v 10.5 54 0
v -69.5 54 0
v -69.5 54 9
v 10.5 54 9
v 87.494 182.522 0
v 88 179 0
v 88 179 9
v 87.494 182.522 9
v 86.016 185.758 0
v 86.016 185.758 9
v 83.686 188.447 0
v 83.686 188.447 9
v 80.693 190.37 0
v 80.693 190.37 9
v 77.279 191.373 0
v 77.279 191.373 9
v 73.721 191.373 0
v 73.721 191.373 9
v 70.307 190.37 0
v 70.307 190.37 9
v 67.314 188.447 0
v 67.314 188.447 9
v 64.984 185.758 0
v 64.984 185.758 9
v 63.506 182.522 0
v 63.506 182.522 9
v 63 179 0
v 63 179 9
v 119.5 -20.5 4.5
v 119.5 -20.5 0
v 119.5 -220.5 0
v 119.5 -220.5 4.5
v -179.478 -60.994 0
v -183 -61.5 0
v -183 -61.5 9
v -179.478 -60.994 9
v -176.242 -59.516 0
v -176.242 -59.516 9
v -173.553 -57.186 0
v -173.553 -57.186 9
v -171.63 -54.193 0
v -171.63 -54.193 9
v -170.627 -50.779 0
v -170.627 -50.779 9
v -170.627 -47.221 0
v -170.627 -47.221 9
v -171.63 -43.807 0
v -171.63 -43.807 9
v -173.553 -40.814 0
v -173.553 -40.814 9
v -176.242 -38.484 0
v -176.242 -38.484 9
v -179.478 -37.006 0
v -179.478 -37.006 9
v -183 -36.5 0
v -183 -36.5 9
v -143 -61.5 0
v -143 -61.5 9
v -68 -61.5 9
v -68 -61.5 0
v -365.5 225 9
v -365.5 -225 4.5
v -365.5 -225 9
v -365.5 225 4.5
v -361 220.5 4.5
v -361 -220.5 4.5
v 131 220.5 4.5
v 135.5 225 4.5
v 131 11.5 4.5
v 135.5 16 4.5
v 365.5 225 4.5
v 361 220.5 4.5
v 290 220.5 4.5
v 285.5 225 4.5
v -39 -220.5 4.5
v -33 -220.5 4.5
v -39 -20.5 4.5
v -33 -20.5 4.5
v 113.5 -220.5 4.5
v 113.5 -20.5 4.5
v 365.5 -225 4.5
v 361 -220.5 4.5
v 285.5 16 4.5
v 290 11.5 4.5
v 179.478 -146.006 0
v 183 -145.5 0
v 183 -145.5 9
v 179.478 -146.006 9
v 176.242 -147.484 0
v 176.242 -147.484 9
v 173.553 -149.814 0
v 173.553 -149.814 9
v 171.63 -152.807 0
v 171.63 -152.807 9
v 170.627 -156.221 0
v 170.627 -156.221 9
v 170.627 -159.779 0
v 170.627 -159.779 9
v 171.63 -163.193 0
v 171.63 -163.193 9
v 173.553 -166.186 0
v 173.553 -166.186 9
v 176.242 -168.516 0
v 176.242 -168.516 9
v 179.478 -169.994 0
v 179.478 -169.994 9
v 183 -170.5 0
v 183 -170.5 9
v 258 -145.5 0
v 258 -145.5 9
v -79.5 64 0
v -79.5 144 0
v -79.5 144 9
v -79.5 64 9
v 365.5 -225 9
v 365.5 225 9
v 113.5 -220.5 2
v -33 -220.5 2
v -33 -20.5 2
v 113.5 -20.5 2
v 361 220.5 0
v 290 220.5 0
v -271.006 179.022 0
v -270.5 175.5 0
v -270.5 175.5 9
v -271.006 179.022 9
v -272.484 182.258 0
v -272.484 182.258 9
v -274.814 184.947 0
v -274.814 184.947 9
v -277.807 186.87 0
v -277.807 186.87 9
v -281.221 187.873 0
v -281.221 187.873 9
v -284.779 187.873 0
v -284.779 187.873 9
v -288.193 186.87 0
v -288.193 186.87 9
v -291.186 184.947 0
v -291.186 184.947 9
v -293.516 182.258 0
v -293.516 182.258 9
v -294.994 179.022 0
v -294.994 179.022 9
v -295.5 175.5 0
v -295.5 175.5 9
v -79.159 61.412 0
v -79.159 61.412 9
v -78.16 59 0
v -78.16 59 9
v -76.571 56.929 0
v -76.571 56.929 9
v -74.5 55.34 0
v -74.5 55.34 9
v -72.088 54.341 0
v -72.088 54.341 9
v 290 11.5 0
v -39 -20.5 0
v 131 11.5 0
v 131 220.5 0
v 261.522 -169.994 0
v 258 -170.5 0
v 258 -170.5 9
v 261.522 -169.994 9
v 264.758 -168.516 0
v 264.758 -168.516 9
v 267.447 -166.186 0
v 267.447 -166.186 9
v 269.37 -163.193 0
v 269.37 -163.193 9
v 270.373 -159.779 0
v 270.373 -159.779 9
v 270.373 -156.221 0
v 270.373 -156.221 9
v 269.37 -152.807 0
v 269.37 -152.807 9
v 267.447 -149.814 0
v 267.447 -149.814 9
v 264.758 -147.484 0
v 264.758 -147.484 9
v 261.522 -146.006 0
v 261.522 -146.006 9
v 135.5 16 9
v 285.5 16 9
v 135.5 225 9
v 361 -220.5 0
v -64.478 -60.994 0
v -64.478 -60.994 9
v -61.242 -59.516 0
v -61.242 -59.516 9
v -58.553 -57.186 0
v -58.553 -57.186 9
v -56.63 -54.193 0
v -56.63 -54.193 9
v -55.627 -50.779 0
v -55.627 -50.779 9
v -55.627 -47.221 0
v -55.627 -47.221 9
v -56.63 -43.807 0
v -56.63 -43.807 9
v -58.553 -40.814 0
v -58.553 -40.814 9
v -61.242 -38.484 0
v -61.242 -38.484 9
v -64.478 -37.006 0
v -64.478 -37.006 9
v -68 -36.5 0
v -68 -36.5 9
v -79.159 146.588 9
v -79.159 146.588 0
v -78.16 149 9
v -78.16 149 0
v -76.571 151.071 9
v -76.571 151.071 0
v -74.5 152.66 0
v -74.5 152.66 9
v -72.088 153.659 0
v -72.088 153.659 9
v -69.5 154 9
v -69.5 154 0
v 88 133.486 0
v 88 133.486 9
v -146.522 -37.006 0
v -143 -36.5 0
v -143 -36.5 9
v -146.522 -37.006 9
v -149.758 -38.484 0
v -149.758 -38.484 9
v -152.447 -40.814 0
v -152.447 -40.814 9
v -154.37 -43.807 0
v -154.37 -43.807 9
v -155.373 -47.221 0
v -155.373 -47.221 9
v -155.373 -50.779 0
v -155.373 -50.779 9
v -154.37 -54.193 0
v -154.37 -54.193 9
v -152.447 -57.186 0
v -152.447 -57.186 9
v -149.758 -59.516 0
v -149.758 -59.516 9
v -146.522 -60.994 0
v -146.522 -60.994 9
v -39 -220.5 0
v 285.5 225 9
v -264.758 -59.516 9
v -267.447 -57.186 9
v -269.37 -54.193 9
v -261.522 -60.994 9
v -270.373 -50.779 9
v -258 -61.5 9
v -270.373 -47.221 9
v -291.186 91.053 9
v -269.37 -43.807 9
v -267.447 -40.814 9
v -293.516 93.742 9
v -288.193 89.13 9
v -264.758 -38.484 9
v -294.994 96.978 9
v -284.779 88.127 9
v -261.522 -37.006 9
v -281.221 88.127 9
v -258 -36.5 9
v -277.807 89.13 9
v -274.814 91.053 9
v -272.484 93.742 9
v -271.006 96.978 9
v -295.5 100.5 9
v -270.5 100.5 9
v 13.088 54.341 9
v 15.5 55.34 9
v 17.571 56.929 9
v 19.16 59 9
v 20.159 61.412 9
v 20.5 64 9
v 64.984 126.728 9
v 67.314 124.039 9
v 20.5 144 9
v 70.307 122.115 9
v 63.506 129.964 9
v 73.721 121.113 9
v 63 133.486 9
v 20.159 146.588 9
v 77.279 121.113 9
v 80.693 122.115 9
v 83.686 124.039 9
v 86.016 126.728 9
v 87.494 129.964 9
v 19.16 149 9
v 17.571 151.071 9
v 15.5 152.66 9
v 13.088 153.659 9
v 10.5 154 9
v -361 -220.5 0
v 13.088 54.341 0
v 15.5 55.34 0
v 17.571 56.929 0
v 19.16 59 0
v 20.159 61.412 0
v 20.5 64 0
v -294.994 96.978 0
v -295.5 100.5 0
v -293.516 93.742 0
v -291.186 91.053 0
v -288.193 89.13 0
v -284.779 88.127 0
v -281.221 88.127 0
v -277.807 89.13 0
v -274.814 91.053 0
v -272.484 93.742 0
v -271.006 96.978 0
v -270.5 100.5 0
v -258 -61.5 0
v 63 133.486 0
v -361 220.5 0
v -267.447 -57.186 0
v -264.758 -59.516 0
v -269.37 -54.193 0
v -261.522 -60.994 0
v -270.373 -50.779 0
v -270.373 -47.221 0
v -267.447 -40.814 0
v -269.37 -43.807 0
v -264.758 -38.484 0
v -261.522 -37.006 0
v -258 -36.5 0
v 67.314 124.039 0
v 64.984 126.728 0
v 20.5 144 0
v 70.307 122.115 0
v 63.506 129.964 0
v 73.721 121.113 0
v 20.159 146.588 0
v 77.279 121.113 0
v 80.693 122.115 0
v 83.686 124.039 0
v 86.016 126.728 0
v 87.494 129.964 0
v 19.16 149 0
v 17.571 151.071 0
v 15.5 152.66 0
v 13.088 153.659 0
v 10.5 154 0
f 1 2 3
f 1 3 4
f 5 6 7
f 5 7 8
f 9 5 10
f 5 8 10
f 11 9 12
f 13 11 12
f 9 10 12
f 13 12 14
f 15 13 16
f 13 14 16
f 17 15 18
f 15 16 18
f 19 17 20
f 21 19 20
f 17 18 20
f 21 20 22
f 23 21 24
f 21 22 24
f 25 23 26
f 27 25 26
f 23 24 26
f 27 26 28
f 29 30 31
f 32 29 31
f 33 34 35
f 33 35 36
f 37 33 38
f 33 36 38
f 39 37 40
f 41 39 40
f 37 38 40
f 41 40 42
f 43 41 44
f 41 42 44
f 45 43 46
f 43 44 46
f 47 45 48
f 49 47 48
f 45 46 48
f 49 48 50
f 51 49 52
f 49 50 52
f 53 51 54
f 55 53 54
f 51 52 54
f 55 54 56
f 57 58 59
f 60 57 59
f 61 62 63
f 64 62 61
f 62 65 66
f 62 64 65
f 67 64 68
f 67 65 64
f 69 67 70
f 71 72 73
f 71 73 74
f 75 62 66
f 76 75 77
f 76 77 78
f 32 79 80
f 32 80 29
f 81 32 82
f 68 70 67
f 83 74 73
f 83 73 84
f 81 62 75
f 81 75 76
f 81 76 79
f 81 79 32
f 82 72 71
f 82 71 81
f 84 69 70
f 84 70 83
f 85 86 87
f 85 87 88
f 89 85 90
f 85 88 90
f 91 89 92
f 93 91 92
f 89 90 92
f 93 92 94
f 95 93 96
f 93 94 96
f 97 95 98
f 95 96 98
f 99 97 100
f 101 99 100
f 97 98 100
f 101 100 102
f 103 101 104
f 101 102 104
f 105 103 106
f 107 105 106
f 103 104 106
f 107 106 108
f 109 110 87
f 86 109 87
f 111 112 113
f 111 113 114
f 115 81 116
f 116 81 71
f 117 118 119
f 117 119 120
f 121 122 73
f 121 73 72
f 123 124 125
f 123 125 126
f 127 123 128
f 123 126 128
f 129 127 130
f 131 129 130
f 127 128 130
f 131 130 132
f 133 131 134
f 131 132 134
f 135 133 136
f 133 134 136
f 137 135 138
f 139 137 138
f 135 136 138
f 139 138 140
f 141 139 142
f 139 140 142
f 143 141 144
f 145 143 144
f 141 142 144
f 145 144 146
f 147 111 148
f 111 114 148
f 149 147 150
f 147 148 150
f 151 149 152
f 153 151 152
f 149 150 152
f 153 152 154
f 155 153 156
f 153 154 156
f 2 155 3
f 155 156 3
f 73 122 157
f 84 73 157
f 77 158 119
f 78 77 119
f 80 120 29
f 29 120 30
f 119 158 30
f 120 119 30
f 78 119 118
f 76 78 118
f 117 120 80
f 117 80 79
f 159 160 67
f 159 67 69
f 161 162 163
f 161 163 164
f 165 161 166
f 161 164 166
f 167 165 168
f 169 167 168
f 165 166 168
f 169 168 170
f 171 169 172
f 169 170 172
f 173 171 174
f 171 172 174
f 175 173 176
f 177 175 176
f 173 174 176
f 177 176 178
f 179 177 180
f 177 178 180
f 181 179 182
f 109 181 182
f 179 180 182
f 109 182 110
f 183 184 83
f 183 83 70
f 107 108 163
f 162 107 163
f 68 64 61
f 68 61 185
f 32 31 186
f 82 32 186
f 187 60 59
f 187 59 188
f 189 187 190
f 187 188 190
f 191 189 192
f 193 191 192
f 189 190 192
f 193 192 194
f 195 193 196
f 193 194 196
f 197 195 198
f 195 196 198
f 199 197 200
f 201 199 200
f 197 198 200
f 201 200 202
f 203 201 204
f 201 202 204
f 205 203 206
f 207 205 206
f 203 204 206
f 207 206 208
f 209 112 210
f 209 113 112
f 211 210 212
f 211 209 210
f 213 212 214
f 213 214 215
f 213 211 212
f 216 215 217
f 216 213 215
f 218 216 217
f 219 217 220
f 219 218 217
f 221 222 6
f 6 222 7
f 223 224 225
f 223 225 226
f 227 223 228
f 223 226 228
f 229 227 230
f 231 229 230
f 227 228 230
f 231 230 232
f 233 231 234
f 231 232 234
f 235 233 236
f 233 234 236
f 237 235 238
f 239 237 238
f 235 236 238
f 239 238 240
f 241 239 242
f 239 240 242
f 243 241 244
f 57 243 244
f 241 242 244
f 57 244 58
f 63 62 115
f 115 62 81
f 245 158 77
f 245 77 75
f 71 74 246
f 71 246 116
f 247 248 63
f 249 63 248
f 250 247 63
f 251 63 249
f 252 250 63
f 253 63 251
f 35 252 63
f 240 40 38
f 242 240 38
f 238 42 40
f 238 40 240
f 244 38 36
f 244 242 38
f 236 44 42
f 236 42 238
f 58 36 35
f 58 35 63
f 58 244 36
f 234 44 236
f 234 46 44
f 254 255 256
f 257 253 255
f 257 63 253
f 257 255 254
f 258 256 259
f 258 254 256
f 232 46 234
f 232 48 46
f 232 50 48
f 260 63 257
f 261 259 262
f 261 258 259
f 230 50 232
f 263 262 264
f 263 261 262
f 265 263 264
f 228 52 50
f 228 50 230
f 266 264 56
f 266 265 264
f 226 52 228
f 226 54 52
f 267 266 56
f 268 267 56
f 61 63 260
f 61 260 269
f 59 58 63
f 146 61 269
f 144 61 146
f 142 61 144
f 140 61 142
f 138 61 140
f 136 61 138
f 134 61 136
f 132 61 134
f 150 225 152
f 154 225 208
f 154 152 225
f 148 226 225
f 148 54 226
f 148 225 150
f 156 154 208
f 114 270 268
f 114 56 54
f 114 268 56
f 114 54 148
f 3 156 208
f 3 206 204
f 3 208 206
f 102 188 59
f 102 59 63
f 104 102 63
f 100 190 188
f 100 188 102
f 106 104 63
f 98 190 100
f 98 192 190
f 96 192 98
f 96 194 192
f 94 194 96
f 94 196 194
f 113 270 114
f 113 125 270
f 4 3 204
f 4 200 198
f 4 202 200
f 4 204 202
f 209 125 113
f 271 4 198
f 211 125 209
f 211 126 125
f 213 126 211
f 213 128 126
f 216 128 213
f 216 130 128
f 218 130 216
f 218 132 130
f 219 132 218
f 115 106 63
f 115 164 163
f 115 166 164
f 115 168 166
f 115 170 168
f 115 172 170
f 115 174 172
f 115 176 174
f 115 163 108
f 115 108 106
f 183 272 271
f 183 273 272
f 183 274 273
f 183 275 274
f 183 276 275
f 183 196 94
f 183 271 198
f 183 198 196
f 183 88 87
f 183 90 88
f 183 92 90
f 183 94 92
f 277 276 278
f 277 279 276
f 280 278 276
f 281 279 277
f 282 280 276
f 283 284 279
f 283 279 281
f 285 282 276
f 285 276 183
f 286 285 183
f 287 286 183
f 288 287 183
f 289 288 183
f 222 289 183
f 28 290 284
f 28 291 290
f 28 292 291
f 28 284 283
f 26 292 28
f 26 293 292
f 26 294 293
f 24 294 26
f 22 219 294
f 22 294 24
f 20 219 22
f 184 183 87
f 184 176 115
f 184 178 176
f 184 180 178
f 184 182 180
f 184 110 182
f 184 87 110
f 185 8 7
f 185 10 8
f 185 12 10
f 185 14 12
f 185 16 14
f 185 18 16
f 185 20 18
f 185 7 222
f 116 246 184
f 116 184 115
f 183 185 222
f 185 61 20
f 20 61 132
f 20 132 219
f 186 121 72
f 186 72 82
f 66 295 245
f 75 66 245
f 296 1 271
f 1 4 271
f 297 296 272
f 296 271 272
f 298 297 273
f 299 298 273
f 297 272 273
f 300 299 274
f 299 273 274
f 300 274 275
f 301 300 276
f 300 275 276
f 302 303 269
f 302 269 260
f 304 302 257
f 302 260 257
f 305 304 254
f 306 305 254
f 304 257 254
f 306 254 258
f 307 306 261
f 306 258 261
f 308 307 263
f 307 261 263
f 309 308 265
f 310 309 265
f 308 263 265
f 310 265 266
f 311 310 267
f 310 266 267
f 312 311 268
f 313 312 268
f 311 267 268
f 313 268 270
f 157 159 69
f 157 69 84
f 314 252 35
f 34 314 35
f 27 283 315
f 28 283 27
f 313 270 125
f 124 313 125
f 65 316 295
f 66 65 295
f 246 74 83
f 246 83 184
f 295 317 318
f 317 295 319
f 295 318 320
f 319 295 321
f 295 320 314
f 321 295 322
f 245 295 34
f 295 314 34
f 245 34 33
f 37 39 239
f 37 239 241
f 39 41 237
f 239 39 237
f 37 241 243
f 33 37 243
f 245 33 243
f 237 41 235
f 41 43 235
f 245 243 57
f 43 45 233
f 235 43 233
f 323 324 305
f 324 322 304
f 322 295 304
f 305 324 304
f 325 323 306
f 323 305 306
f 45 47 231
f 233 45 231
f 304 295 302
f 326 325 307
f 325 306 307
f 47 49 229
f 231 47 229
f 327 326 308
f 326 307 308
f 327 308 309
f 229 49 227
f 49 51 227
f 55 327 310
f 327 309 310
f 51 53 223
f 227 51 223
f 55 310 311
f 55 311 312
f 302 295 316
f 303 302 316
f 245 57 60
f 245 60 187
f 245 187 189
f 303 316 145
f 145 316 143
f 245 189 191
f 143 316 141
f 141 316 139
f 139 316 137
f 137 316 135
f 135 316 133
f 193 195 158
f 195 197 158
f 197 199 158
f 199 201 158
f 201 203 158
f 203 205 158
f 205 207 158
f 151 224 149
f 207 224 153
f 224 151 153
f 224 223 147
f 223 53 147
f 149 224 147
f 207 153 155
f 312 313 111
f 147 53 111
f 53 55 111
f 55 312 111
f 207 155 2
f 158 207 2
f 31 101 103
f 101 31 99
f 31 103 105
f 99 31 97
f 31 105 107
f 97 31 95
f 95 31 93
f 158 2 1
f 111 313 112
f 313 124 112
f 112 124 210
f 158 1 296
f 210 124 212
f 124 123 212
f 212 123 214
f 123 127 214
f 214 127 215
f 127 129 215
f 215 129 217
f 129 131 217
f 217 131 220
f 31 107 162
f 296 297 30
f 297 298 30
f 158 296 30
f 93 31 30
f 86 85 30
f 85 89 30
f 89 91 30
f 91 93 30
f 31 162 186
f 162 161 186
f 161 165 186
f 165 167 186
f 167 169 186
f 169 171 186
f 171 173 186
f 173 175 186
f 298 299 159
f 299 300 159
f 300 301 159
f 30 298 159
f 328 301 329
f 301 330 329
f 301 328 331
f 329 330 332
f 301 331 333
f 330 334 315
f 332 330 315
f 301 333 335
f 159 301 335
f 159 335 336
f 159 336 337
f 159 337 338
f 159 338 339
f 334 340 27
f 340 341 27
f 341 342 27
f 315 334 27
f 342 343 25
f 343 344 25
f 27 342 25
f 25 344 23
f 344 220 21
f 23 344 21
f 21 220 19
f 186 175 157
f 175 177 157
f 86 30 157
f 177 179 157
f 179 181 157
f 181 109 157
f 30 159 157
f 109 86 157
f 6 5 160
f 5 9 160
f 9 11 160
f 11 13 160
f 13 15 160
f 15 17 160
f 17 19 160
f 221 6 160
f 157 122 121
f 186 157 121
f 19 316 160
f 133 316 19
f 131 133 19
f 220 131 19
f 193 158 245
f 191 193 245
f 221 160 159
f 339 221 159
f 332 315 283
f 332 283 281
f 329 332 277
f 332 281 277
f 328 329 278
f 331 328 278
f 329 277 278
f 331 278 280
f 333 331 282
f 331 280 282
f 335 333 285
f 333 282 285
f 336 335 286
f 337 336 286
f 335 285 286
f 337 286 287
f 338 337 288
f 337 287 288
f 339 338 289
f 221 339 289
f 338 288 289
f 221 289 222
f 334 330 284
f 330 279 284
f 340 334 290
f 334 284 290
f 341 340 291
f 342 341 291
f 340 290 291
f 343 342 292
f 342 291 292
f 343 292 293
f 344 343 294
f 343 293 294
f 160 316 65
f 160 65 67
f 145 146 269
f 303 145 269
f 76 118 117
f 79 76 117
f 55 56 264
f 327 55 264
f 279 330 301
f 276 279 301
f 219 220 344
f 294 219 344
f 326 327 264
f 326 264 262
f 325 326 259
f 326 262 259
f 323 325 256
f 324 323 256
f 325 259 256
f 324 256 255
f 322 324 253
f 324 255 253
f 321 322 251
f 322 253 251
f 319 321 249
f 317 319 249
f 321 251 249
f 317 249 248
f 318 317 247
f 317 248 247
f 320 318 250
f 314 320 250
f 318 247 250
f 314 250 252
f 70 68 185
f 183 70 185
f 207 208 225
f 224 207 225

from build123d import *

# Parameters (mm, degrees)
F0_W      = 731
F0_H      = 450
F1_DEPTH  = 9
F2_W      = 731
F2_H      = 450
F2_W_2    = 722
F2_H_2    = 441
F3_DEPTH  = 4.5
F4_W      = 150
F4_H      = 9
F5_DEPTH  = 209
F6_W      = 4.5
F6_H      = 209
F7_DEPTH  = 4.5
F8_W      = 159
F8_H      = 4.5
F9_DEPTH  = 4.5
F10_W     = 25
F10_H     = 45.514172
F11_DEPTH = 9.001
F13_DEPTH = 9.001
F15_DEPTH = 9
F16_W     = 100
F16_H     = 100
F17_DEPTH = 9
F18_R     = 10
F20_DEPTH = 9
F21_W     = 6
F21_H     = 200
F22_DEPTH = 4.5
F23_W     = 146.5
F23_H     = 200
F24_DEPTH = 2


with BuildPart() as f1:
    # F0 (on Top) → F1 (new body)
    with BuildSketch(Plane.XY):
        Rectangle(F0_W, F0_H)
    extrude(amount=F1_DEPTH)

    # F2 (on face) → F3 (cut)
    with BuildSketch(Plane(origin=(0, 0, 0), x_dir=(1, 0, 0), z_dir=(0, 0, -1))):
        Rectangle(F2_W, F2_H)
        Rectangle(F2_W_2, F2_H_2, mode=Mode.SUBTRACT)
    extrude(amount=-F3_DEPTH, mode=Mode.SUBTRACT)

    # F4 (on face) → F5 (cut)
    with BuildSketch(Plane(origin=(0, 225, 0), x_dir=(-1, 0, 0), z_dir=(0, 1, 0))):
        with Locations((-210.5, 4.5)):
            Rectangle(F4_W, F4_H)
    extrude(amount=-F5_DEPTH, mode=Mode.SUBTRACT)

    # F6 (on face) → F7 (cut)
    with BuildSketch(Plane(origin=(0, 0, 0), x_dir=(1, 0, 0), z_dir=(0, 0, -1))):
        with Locations((133.25, -120.5)):
            Rectangle(F6_W, F6_H)
        with Locations((287.75, -120.5)):
            Rectangle(F6_W, F6_H)
    extrude(amount=-F7_DEPTH, mode=Mode.SUBTRACT)

    # F8 (on face) → F9 (cut)
    with BuildSketch(Plane(origin=(0, 0, 0), x_dir=(1, 0, 0), z_dir=(0, 0, -1))):
        with Locations((210.5, -13.75)):
            Rectangle(F8_W, F8_H)
    extrude(amount=-F9_DEPTH, mode=Mode.SUBTRACT)

    # F10 (on face) → F11 (cut, through all)
    with BuildSketch(Plane.XY.offset(9)):
        with BuildLine():
            Line((63, 179), (88, 179))
            ThreePointArc((88, 179), (75.5, 191.5), (63, 179))
        make_face()
        with Locations((75.5, 156.242914)):
            Rectangle(F10_W, F10_H)
        with BuildLine():
            ThreePointArc((63, 133.485828), (75.5, 120.985828), (88, 133.485828))
            Line((88, 133.485828), (63, 133.485828))
        make_face()
    extrude(amount=-F11_DEPTH, mode=Mode.SUBTRACT)

    # F12 (on face) → F13 (cut, through all)
    with BuildSketch(Plane.XY.offset(9)):
        with BuildLine():
            Line((-183, -36.5), (-258, -36.5))
            ThreePointArc((-258, -36.5), (-270.5, -49), (-258, -61.5))
            Line((-258, -61.5), (-183, -61.5))
            ThreePointArc((-183, -61.5), (-170.5, -49), (-183, -36.5))
        make_face()
        with BuildLine():
            Line((-68, -36.5), (-143, -36.5))
            ThreePointArc((-143, -36.5), (-155.5, -49), (-143, -61.5))
            Line((-143, -61.5), (-68, -61.5))
            ThreePointArc((-68, -61.5), (-55.5, -49), (-68, -36.5))
        make_face()
    extrude(amount=-F13_DEPTH, mode=Mode.SUBTRACT)

    # F14 (on face) → F15 (cut, through all)
    with BuildSketch(Plane.XY.offset(9)):
        with BuildLine():
            ThreePointArc((-270.5, 175.5), (-283, 188), (-295.5, 175.5))
            Line((-295.5, 175.5), (-295.5, 100.5))
            ThreePointArc((-295.5, 100.5), (-283, 88), (-270.5, 100.5))
            Line((-270.5, 100.5), (-270.5, 175.5))
        make_face()
    extrude(amount=-F15_DEPTH, mode=Mode.SUBTRACT)

    # F16 (on face) → F17 (cut, through all)
    with BuildSketch(Plane(origin=(0, 0, 0), x_dir=(1, 0, 0), z_dir=(0, 0, -1))):
        with Locations((-29.5, -104)):
            Rectangle(F16_W, F16_H)
    extrude(amount=-F17_DEPTH, mode=Mode.SUBTRACT)

    # F18
    f18_edges = [f1.edges().sort_by_distance(p)[0] for p in [
        (20.5, 154, 4.5),
        (-79.5, 154, 4.5),
        (-79.5, 54, 4.5),
        (20.5, 54, 4.5),
    ]]
    fillet(f18_edges, radius=F18_R)

    # F19 (on face) → F20 (cut, through all)
    with BuildSketch(Plane.XY.offset(9)):
        with BuildLine():
            ThreePointArc((258, -170.5), (270.5, -158), (258, -145.5))
            Line((258, -145.5), (183, -145.5))
            ThreePointArc((183, -145.5), (170.5, -158), (183, -170.5))
            Line((183, -170.5), (258, -170.5))
        make_face()
    extrude(amount=-F20_DEPTH, mode=Mode.SUBTRACT)

    # F21 (on face) → F22 (cut)
    with BuildSketch(Plane(origin=(0, 0, 0), x_dir=(1, 0, 0), z_dir=(0, 0, -1))):
        with Locations((-36, 120.5)):
            Rectangle(F21_W, F21_H)
        with Locations((116.5, 120.5)):
            Rectangle(F21_W, F21_H)
    extrude(amount=-F22_DEPTH, mode=Mode.SUBTRACT)

    # F23 (on face) → F24 (cut)
    with BuildSketch(Plane(origin=(0, 0, 0), x_dir=(1, 0, 0), z_dir=(0, 0, -1))):
        with Locations((40.25, 120.5)):
            Rectangle(F23_W, F23_H)
    extrude(amount=-F24_DEPTH, mode=Mode.SUBTRACT)


solid = f1.part
